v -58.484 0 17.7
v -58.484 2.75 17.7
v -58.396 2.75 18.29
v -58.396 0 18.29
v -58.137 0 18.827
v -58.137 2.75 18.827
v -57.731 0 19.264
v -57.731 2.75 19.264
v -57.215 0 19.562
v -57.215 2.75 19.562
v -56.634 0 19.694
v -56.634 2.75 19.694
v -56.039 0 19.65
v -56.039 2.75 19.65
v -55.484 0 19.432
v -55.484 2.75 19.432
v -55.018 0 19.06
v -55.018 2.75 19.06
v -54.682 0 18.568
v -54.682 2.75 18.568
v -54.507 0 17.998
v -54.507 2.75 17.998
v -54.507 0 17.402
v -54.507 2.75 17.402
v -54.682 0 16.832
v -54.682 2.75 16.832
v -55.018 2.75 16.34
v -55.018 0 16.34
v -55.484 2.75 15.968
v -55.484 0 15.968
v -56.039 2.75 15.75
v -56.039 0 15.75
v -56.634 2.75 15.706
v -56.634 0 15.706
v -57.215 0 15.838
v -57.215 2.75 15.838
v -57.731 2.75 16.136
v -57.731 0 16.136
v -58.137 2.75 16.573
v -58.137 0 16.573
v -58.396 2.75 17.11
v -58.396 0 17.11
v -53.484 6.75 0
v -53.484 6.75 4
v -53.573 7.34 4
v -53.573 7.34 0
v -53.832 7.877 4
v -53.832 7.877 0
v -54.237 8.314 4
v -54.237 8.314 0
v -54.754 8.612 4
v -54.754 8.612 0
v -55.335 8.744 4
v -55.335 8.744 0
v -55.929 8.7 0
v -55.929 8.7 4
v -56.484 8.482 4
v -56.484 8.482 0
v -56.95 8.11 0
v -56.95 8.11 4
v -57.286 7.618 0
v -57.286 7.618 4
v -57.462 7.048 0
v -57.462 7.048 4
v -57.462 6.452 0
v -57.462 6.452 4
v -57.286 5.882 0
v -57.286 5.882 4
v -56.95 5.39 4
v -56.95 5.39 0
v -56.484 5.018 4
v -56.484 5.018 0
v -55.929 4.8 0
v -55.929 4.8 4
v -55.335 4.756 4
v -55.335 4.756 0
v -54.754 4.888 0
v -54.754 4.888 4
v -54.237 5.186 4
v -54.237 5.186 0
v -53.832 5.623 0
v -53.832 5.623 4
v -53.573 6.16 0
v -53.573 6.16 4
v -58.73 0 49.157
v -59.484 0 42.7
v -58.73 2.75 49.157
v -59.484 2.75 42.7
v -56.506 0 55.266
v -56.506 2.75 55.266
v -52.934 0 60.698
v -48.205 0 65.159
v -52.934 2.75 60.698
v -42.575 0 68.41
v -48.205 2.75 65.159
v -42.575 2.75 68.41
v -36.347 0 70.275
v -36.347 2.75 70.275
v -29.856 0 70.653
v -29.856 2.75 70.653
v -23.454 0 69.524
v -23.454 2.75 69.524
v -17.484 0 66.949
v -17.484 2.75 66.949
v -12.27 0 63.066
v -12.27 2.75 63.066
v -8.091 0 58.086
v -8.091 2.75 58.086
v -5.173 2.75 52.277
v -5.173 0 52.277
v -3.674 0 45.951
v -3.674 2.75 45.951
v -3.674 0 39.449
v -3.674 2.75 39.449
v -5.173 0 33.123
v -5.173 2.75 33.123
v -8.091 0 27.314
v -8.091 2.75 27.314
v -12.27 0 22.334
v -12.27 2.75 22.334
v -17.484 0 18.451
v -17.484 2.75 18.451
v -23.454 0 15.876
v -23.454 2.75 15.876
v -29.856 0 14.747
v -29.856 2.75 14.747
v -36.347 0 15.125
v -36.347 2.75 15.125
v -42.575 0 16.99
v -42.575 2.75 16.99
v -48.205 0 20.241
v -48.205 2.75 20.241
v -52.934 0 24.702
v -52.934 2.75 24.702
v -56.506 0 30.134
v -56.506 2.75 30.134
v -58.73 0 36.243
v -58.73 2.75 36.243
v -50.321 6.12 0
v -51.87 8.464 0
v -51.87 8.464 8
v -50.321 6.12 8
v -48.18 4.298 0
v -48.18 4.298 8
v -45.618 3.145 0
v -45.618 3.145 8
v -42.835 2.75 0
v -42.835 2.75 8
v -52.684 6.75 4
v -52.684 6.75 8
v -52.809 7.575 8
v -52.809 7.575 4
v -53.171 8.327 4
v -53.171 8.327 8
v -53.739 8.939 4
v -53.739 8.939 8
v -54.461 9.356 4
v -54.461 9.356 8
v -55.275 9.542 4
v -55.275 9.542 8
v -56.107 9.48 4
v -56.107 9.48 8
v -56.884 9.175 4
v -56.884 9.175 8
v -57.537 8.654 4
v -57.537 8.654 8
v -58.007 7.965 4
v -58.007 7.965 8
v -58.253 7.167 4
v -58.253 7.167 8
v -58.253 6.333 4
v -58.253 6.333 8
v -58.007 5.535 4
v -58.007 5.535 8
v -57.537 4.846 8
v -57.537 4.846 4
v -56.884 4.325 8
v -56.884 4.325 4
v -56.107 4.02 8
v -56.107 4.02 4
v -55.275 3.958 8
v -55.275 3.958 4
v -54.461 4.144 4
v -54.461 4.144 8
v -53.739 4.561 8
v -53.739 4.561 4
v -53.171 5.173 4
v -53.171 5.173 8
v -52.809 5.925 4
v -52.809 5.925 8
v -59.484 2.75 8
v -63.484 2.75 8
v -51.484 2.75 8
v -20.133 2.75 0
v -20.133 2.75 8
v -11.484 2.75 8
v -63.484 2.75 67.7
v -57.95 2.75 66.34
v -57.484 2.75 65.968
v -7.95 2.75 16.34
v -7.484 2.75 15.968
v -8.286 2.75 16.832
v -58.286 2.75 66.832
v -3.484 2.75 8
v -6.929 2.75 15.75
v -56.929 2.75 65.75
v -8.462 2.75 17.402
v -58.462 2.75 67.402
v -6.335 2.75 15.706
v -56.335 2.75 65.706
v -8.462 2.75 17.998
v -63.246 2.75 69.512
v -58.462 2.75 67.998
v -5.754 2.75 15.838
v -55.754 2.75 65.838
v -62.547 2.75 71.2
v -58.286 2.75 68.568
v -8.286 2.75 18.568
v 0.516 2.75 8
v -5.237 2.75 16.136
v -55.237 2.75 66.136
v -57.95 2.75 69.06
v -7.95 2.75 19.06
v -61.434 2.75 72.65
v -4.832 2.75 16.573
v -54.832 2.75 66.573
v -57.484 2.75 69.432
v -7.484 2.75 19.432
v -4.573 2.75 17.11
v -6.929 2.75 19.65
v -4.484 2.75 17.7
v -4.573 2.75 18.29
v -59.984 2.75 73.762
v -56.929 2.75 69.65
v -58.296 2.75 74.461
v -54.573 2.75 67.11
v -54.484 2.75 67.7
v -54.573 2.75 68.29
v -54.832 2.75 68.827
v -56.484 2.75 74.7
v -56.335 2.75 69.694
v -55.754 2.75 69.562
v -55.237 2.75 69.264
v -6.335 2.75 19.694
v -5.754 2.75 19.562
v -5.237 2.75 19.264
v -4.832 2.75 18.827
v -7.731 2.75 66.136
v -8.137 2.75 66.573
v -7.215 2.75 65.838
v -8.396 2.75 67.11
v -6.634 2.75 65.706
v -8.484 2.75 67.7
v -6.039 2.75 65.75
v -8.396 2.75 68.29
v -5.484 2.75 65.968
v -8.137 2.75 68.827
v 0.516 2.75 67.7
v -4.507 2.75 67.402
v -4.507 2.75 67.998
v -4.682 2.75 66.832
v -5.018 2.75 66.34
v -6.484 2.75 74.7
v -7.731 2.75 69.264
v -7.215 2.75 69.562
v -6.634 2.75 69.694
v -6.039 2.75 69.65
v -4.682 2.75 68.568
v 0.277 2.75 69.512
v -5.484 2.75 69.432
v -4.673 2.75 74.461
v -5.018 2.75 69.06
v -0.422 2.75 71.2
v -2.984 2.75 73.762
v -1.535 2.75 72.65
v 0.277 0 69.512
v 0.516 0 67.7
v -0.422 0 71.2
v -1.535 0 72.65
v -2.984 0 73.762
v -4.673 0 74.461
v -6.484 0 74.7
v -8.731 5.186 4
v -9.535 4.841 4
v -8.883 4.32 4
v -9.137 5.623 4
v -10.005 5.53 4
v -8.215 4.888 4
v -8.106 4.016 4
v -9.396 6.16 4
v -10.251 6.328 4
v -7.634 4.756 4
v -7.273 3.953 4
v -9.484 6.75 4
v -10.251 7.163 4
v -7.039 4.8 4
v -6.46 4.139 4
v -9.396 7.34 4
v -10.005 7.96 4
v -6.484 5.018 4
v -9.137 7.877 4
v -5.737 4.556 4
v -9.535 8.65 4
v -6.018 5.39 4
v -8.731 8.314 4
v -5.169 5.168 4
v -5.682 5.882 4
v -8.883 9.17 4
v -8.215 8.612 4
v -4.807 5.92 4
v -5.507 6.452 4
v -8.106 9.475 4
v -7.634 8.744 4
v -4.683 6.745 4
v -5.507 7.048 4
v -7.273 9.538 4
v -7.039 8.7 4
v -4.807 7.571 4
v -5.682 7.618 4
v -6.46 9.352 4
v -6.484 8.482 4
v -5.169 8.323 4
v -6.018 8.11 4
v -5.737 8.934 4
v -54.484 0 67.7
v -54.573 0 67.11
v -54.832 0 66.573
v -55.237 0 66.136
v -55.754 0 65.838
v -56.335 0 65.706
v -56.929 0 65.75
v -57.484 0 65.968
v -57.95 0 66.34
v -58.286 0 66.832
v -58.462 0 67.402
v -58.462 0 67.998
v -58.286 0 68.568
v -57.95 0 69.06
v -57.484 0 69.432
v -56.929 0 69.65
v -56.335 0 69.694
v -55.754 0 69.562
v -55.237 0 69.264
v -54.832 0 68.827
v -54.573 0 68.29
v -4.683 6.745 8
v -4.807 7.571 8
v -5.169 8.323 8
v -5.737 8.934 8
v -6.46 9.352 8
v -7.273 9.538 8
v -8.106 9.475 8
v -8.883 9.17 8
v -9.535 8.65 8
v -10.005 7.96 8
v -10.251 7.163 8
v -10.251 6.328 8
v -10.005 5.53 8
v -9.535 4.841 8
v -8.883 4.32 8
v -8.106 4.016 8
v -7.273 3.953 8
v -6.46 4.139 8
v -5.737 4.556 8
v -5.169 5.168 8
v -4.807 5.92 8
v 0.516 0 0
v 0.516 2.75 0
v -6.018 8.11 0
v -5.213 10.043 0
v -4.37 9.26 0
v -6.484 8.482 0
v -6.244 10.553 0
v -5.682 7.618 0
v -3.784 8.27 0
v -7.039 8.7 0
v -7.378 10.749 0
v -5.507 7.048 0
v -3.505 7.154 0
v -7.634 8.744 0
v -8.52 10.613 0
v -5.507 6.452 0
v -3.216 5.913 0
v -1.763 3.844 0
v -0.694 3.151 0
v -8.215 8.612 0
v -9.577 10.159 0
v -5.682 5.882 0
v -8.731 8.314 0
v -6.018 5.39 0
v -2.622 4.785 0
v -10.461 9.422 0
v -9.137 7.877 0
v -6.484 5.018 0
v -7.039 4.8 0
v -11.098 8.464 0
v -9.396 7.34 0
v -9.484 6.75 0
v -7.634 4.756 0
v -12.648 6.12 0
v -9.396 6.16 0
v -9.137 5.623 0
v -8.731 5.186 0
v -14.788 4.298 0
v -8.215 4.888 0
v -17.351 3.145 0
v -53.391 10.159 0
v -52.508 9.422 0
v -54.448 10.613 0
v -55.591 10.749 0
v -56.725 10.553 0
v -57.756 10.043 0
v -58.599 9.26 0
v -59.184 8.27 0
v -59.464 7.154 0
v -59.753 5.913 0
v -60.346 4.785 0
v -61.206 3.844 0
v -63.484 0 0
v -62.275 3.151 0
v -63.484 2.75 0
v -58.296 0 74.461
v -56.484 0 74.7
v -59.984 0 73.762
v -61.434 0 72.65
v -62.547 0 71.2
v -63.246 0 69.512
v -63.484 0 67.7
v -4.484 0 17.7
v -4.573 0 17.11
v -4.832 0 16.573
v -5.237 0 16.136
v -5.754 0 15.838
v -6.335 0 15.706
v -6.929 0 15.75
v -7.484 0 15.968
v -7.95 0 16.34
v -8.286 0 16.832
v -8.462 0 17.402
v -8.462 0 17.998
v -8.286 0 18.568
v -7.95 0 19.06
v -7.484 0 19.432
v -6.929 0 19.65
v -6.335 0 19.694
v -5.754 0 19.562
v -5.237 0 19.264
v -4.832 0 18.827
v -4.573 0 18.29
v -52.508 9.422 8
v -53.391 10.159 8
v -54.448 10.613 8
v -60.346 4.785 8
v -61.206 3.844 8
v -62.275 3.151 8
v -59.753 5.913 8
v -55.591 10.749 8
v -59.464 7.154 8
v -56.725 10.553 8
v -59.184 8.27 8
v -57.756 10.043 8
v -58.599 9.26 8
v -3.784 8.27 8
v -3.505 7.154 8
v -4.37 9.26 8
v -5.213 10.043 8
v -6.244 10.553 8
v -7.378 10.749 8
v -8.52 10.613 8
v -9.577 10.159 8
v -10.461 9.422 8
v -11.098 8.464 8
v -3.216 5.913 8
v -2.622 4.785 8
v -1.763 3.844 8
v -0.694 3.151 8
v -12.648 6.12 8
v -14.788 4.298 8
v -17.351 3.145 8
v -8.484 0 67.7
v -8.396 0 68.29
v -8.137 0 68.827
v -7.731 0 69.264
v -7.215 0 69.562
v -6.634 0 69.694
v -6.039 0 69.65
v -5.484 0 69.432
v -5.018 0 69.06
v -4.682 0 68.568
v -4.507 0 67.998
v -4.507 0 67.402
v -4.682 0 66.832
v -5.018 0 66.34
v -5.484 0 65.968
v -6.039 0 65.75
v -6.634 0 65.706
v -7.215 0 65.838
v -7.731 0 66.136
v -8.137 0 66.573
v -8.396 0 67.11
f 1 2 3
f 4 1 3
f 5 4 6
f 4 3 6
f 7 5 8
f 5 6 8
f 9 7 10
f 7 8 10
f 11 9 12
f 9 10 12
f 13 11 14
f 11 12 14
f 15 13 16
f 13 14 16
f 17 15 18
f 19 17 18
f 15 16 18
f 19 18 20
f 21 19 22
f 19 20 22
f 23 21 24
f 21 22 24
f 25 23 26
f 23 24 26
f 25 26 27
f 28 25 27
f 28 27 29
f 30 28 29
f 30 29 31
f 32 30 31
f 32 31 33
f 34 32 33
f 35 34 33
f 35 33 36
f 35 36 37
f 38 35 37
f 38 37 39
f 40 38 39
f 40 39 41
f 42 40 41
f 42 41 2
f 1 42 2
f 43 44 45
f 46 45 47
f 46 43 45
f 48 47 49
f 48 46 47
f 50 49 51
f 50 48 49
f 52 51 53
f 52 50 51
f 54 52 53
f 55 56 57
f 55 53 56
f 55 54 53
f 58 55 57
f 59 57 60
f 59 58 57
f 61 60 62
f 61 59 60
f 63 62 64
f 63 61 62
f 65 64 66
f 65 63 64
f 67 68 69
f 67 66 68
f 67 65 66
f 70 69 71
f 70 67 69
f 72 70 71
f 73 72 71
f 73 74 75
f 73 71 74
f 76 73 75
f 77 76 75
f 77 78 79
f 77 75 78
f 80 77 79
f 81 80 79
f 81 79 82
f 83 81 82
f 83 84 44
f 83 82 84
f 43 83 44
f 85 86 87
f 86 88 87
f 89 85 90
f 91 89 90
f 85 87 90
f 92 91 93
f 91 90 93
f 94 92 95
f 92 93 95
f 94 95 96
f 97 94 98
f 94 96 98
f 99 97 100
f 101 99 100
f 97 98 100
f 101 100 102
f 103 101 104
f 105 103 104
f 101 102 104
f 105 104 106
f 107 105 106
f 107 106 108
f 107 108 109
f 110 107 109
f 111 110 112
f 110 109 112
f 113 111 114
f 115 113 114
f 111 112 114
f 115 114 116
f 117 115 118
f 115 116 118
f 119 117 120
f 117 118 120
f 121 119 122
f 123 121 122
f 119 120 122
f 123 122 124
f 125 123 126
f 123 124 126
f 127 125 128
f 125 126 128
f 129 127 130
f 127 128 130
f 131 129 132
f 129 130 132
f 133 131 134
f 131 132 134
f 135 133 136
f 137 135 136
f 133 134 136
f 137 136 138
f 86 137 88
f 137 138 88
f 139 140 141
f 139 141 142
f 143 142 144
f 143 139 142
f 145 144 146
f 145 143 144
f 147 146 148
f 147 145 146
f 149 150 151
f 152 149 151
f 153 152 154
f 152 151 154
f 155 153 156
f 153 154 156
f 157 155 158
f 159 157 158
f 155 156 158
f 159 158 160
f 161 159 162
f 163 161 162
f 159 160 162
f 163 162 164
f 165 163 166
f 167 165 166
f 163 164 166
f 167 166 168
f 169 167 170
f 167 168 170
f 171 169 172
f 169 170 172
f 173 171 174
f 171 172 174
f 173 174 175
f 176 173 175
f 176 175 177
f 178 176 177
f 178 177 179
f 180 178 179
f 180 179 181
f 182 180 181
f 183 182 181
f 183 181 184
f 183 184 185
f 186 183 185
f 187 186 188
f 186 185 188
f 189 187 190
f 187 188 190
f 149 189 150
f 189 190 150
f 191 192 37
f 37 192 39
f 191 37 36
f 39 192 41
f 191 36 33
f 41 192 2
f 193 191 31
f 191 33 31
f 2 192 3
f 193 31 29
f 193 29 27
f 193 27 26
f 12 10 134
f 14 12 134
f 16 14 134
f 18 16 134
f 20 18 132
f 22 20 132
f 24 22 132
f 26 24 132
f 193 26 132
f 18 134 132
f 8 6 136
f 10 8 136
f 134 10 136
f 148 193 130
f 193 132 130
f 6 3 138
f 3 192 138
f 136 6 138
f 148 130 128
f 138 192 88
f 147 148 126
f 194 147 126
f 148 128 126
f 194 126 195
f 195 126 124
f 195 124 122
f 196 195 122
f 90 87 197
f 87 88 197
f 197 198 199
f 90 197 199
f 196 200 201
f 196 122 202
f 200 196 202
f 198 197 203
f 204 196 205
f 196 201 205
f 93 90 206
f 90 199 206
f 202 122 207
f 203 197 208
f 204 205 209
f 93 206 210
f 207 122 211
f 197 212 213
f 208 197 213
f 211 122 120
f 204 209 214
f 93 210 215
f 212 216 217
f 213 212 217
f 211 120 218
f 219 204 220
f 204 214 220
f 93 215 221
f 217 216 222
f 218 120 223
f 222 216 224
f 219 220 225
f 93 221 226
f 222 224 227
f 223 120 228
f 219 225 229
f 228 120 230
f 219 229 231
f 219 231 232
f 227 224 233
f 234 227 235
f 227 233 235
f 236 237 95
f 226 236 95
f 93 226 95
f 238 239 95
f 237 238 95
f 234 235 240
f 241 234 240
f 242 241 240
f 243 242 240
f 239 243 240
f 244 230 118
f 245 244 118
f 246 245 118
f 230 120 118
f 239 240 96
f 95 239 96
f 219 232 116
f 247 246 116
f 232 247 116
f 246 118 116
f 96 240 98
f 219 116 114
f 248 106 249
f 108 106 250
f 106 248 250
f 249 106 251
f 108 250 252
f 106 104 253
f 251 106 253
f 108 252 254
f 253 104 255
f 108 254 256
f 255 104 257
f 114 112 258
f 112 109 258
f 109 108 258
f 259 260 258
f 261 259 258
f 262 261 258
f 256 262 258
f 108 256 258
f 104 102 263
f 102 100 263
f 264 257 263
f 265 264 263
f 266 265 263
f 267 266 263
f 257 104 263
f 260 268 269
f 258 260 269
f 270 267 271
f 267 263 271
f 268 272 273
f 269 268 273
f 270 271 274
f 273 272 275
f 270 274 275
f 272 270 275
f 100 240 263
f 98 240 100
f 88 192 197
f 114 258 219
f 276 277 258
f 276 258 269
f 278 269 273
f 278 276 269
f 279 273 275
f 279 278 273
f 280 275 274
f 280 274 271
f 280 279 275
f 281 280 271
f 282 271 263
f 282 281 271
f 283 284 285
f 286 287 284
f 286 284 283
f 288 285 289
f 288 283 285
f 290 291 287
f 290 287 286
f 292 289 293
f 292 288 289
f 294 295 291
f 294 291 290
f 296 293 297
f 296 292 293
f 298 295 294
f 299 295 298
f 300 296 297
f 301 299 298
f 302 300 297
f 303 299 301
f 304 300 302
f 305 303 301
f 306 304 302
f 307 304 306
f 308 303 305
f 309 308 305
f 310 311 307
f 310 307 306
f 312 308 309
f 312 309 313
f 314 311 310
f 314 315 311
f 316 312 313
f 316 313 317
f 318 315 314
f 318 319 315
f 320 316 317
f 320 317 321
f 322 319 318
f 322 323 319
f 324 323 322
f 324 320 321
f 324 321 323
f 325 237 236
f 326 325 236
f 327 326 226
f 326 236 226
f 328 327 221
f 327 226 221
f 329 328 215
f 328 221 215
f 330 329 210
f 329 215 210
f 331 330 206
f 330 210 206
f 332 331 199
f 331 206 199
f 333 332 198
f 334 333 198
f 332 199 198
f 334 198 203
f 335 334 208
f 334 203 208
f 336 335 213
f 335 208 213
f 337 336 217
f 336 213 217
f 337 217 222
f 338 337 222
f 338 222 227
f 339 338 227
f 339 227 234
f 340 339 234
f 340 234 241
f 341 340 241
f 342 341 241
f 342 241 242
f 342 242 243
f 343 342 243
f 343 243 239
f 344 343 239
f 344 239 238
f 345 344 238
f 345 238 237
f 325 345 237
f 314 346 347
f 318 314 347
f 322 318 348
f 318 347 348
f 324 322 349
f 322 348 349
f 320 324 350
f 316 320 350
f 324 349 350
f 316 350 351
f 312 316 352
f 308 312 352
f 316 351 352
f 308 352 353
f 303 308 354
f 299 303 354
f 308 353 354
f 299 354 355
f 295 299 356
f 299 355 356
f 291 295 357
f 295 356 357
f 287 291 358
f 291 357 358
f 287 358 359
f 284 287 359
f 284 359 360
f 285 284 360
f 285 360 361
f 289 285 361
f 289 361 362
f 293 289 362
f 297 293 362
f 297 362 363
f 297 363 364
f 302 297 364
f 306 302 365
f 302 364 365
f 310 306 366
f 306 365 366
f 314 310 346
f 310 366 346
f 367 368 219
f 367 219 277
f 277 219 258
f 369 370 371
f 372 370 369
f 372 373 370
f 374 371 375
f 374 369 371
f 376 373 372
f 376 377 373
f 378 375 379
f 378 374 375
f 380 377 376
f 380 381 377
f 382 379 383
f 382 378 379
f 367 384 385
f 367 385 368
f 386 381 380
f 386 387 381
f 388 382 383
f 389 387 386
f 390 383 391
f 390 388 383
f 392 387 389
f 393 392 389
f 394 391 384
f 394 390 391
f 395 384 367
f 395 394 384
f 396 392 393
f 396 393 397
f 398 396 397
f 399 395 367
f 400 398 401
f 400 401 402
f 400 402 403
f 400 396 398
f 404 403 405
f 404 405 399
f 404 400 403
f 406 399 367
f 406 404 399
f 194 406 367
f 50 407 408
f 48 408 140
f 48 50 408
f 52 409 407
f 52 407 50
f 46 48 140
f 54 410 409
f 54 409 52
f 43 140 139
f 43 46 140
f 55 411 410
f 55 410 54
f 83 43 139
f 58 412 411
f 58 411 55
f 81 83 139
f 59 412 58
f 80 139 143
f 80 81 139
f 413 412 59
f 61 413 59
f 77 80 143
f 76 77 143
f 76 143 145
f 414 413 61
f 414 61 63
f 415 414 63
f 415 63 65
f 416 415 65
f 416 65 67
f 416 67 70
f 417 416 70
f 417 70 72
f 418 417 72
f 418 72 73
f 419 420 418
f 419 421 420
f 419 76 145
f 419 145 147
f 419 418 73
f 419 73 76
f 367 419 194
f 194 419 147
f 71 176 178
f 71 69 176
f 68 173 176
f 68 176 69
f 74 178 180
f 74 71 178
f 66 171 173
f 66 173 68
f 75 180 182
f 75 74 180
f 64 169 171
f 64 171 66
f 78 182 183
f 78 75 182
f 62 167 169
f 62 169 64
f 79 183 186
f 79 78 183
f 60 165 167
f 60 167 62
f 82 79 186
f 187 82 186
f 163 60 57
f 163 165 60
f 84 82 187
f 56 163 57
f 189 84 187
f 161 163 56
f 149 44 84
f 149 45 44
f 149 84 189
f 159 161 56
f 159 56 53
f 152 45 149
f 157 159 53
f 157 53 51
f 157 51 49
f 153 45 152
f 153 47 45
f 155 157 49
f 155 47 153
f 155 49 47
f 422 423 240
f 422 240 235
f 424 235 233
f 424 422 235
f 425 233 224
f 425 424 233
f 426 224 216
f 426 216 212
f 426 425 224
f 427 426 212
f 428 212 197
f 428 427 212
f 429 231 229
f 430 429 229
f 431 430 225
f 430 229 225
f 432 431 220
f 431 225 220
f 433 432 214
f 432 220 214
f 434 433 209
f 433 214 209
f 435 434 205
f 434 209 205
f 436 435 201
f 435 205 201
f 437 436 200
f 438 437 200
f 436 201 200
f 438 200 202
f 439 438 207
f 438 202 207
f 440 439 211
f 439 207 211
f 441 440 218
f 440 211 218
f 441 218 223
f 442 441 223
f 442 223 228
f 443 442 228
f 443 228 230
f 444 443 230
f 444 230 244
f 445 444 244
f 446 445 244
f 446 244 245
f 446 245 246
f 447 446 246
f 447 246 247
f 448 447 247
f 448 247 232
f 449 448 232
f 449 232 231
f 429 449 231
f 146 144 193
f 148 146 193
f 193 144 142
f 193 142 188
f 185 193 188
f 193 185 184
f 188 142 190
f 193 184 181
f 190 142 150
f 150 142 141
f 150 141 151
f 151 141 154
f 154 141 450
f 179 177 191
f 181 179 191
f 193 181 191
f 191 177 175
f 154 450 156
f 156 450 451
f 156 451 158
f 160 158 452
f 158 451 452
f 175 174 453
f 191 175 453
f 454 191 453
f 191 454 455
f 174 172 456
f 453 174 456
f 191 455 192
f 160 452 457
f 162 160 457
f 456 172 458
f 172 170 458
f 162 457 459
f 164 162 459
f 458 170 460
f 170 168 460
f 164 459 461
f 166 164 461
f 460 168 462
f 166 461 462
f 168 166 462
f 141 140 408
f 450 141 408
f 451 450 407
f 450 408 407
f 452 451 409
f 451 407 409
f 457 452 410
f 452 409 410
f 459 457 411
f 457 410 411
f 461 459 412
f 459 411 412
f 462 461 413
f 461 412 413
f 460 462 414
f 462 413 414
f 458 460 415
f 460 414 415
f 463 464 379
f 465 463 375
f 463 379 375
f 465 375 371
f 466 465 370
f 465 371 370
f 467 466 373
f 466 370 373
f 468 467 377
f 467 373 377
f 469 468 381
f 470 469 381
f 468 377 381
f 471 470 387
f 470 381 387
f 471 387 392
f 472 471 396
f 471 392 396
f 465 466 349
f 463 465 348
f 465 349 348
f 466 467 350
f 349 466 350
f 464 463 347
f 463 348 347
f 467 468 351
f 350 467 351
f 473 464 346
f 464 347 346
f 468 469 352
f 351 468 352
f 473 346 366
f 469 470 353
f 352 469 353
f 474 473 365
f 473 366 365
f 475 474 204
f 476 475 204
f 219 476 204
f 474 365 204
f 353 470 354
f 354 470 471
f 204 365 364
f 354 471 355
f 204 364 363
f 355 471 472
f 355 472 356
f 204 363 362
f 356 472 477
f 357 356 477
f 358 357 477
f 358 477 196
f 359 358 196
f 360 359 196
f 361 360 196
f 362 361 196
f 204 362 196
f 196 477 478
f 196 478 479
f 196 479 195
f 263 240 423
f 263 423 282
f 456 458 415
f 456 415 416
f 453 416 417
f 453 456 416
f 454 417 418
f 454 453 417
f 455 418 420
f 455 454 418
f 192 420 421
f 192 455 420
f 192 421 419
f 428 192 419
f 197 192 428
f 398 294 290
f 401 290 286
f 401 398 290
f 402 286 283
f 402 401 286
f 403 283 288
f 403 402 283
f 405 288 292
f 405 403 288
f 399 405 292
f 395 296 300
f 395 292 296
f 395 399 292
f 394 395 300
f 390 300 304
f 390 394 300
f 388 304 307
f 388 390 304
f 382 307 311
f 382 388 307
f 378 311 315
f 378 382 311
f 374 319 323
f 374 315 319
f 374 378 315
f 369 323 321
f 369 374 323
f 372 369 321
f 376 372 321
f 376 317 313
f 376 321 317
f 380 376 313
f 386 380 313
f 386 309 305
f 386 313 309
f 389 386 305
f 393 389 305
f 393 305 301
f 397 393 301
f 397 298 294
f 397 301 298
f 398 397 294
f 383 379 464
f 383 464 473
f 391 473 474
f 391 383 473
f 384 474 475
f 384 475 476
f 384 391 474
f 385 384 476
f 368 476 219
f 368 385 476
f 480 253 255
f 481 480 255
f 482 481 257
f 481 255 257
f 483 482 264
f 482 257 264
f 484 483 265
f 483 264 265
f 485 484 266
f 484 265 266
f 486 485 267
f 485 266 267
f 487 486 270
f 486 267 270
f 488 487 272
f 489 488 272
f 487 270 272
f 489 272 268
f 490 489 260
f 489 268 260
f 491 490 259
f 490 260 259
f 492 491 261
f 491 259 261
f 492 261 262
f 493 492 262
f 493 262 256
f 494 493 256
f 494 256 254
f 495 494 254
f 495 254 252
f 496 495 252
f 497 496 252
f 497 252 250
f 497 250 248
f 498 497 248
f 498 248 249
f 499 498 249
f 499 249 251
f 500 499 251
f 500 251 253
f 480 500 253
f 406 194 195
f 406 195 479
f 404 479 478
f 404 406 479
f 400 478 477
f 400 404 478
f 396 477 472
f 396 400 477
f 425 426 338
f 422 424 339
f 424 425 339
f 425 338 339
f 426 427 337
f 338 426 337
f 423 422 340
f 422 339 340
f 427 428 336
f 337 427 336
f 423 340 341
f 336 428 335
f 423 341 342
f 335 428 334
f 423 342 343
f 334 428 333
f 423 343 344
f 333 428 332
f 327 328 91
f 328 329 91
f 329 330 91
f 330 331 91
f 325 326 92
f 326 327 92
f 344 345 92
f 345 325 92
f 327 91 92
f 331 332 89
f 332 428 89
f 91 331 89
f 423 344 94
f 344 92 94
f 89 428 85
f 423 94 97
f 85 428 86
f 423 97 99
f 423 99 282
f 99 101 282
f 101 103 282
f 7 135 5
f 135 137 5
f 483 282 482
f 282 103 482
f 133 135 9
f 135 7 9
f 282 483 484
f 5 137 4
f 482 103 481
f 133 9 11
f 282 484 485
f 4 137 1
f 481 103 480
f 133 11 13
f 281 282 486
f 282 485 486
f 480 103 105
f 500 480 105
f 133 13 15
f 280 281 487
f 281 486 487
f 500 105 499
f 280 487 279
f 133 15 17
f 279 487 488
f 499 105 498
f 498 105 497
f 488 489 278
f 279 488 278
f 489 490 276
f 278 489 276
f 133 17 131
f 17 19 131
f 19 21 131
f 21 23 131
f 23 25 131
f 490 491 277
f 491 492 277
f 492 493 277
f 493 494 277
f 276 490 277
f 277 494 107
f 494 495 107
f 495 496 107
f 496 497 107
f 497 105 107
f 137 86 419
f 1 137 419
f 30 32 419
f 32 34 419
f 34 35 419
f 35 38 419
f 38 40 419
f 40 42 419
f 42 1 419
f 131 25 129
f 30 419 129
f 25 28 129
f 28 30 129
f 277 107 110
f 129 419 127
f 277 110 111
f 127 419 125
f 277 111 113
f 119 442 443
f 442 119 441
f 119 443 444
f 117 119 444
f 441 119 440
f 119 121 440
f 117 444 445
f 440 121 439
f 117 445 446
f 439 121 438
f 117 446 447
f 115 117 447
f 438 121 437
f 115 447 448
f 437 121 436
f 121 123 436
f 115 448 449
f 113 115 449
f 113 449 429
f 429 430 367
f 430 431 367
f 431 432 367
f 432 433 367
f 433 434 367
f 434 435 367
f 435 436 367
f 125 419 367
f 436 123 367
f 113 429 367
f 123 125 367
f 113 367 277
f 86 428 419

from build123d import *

# Parameters (mm, degrees)
SCHIZZO1_R                        = 2
ESTRUSIONE_ESTRUSIONE1_DEPTH      = 8
SCHIZZO3_W                        = 50
SCHIZZO3_H                        = 2.75
ESTRUSIONE_ESTRUSIONE3_DEPTH      = 55
RACCORDO1_R                       = 4
SCHIZZO4_R                        = 23
TAGLIO_ESTRUSIONE1_DEPTH          = 4
SCHIZZO5_R                        = 2
TAGLIO_ESTRUSIONE2_DEPTH          = 4
RACCORDO2_R                       = 124
SCHIZZO6_R                        = 2.8
TAGLIO_ESTRUSIONE3_DEPTH          = 4
SCHIZZO7_W                        = 64
SCHIZZO7_H                        = 66
SCHIZZO7_R                        = 28
ESTRUSIONE_ESTRUSIONE4_DEPTH      = 4
SCHIZZO8_R                        = 28
TAGLIO_ESTRUSIONE4_DEPTH          = 10
SCHIZZO9_R                        = 2
TAGLIO_ESTRUSIONE5_DEPTH          = 4
RACCORDO3_R                       = 3
RACCORDO4_R                       = 3
SCHIZZO10_W                       = 88.736042833
SCHIZZO10_H                       = 81.022332295
TAGLIO_ESTRUSIONE6_DEPTH          = 1.25
SCHIZZO11_W                       = 58
SCHIZZO11_H                       = 2.75
ESTRUSIONE_ESTRUSIONE5_DEPTH      = 0.7
RACCORDO6_START                   = -1
RACCORDO6_DEPTH                   = 5
RACCORDO8_START                   = -1
RACCORDO8_DEPTH                   = 5
ESTRUSIONE_ESTRUSIONE6_DEPTH      = 4
ESTRUSIONE_ESTRUSIONE6_DEPTH_BACK = 2.75
SCHIZZO12_W                       = 64
SCHIZZO12_H                       = 11.748328584
SCHIZZO14_W                       = 64
SCHIZZO14_H                       = 11.748328584
TAGLIO_ESTRUSIONE7_DEPTH          = 4
RACCORDO9_R                       = 10
RACCORDO10_R                      = 5


with BuildPart() as part:
    # Schizzo1 → Estrusione-Estrusione1 (new body)
    with BuildSketch(Plane.XY):
        with BuildLine():
            Line((-59.484364928, 0), (-3.484364928, 0))
            Line((-3.484364928, 0), (-3.484364928, 6.75))
            ThreePointArc((-3.484364928, 6.75), (-7.484364928, 10.75), (-11.484364928, 6.75))
            Line((-11.484364928, 6.75), (-11.484364928, 2.75))
            Line((-11.484364928, 2.75), (-23.484364928, 2.75))
            Line((-23.484364928, 2.75), (-39.484364928, 2.75))
            Line((-39.484364928, 2.75), (-51.484364928, 2.75))
            Line((-51.484364928, 2.75), (-51.484364928, 6.75))
            ThreePointArc((-51.484364928, 6.75), (-55.484364928, 10.75), (-59.484364928, 6.75))
            Line((-59.484364928, 6.75), (-59.484364928, 0))
        make_face()
        with Locations((-55.484364928, 6.75)):
            Circle(SCHIZZO1_R, mode=Mode.SUBTRACT)
        with Locations(Location((-7.484364928, 6.75, 0), (0, 0, 180))):
            Circle(SCHIZZO1_R, mode=Mode.SUBTRACT)
    extrude(amount=ESTRUSIONE_ESTRUSIONE1_DEPTH)

    # Schizzo3 → Estrusione-Estrusione3 (add)
    with BuildSketch(Plane.XY.offset(8)):
        with Locations((-31.482821648, 1.375)):
            Rectangle(SCHIZZO3_W, SCHIZZO3_H)
    extrude(amount=ESTRUSIONE_ESTRUSIONE3_DEPTH)

    # Raccordo1
    raccordo1_edges = [part.edges().sort_by_distance(p)[0] for p in [
        (-56.482821648, 1.375, 63),
        (-6.482821648, 1.375, 63),
    ]]
    fillet(raccordo1_edges, radius=RACCORDO1_R)

    # Schizzo4 → Taglio-Estrusione1 (cut)
    with BuildSketch(Plane(origin=(0, 2.75, 0), x_dir=(1, 0, 0), z_dir=(0, 1, 0))):
        with Locations(Location((-31.482821648, -35.97589666, 0), (0, 0, 180))):
            Circle(SCHIZZO4_R)
    extrude(amount=-TAGLIO_ESTRUSIONE1_DEPTH, mode=Mode.SUBTRACT)

    # Schizzo5 → Taglio-Estrusione2 (cut)
    with BuildSketch(Plane(origin=(0, 2.75, 0), x_dir=(1, 0, 0), z_dir=(0, 1, 0))):
        with Locations(Location((-51.482821648, -15.97589666, 0), (0, 0, 180))):
            Circle(SCHIZZO5_R)
        with Locations(Location((-51.482821648, -55.97589666, 0), (0, 0, 180))):
            Circle(SCHIZZO5_R)
        with Locations(Location((-11.482821648, -15.97589666, 0), (0, 0, 180))):
            Circle(SCHIZZO5_R)
        with Locations(Location((-11.482821648, -55.97589666, 0), (0, 0, 180))):
            Circle(SCHIZZO5_R)
    extrude(amount=-TAGLIO_ESTRUSIONE2_DEPTH, mode=Mode.SUBTRACT)

    # Raccordo2
    # the kernel refuses this fillet: 124 mm, written as the material it adds along each edge
    with BuildSketch(Plane(origin=(-56.482821648, 2.75, 8), x_dir=(0, 0, 1), z_dir=(0, -1, 0))) as raccordo2_piece_1:
        with BuildLine():
            CenterArc((27.117770399, 124), RACCORDO2_R, 257.367798326, 12.632201674)
            Line((0, 3.00154328), (0, 0))
            Line((0, 0), (27.117770399, 0))
        make_face()
    extrude(amount=2.75)
    with BuildSketch(Plane(origin=(-6.482821648, 0, 8), x_dir=(0, 0, 1), z_dir=(0, 1, 0))) as raccordo2_piece_2:
        with BuildLine():
            CenterArc((27.10399461, 124), RACCORDO2_R, 257.374321421, 12.625678579)
            Line((0, 2.99845672), (0, 0))
            Line((0, 0), (27.10399461, 0))
        make_face()
    extrude(amount=2.75)

    # Schizzo6 → Taglio-Estrusione3 (cut)
    with BuildSketch(Plane.XY.offset(8)):
        with Locations((-55.484364928, 6.75)):
            Circle(SCHIZZO6_R)
        with Locations((-7.48260826, 6.745335699)):
            Circle(SCHIZZO6_R)
    extrude(amount=-TAGLIO_ESTRUSIONE3_DEPTH, mode=Mode.SUBTRACT)

    # Schizzo7 → Estrusione-Estrusione4 (add)
    with BuildSketch(Plane(origin=(0, 2.75, 0), x_dir=(1, 0, 0), z_dir=(0, 1, 0))):
        with Locations((-31.484364928, -41)):
            Rectangle(SCHIZZO7_W, SCHIZZO7_H)
        with Locations(Location((-31.484364928, -42.7, 0), (0, 0, 180))):
            Circle(SCHIZZO7_R, mode=Mode.SUBTRACT)
    extrude(amount=-ESTRUSIONE_ESTRUSIONE4_DEPTH)

    # Schizzo8 → Taglio-Estrusione4 (cut)
    with BuildSketch(Plane(origin=(0, 2.75, 0), x_dir=(1, 0, 0), z_dir=(0, 1, 0))):
        with Locations(Location((-31.484364928, -42.7, 0), (0, 0, 180))):
            Circle(SCHIZZO8_R)
    extrude(amount=-TAGLIO_ESTRUSIONE4_DEPTH, mode=Mode.SUBTRACT)

    # Schizzo9 → Taglio-Estrusione5 (cut)
    with BuildSketch(Plane(origin=(0, 2.75, 0), x_dir=(1, 0, 0), z_dir=(0, 1, 0))):
        with Locations(Location((-6.484364928, -67.7, 0), (0, 0, 180))):
            Circle(SCHIZZO9_R)
        with Locations((-6.484364928, -17.7)):
            Circle(SCHIZZO9_R)
        with Locations((-56.484364928, -67.7)):
            Circle(SCHIZZO9_R)
        with Locations(Location((-56.484364928, -17.7, 0), (0, 0, 180))):
            Circle(SCHIZZO9_R)
    extrude(amount=-TAGLIO_ESTRUSIONE5_DEPTH, mode=Mode.SUBTRACT)

    # Raccordo3
    # the kernel refuses this fillet: 3 mm, written as the material it adds along each edge
    with BuildSketch(Plane(origin=(-59.484364928, 0, 8), x_dir=(0, -1, 0), z_dir=(1, 0, 0))) as raccordo3_piece_1:
        with BuildLine():
            CenterArc((3, 2.436698586), RACCORDO3_R, 180, 54.314665287)
            Line((0, 2.436698586), (0, 0))
            Line((0, 0), (1.25, 0))
        make_face()
    extrude(amount=56)
    with BuildSketch(Plane(origin=(-3.484364928, 0, 8), x_dir=(1, 0, 0), z_dir=(0, 1, 0)), Plane(origin=(-59.484364928, 2.75, 8), x_dir=(-1, 0, 0), z_dir=(0, -1, 0))) as raccordo3_piece_2:
        with BuildLine():
            CenterArc((RACCORDO3_R, RACCORDO3_R), RACCORDO3_R, 180, 90)
            Line((0, RACCORDO3_R), (0, 0))
            Line((0, 0), (RACCORDO3_R, 0))
        make_face()
    extrude(amount=2.75)
    with BuildSketch(Plane(origin=(-65.576111393, 0, 8), x_dir=(0, -1, 0), z_dir=(1, 0, 0))) as raccordo3_piece_3a_section:
        with BuildLine():
            CenterArc((3, 2.436698586), RACCORDO3_R, 180, 54.314665287)
            Line((0, 2.436698586), (0, 0))
            Line((0, 0), (1.25, 0))
        make_face()
    raccordo3_piece_3a = extrude(amount=62.091746466, mode=Mode.PRIVATE)
    raccordo3_piece_3a = split(raccordo3_piece_3a, bisect_by=Plane(origin=(-63.484364928, 0, 8), z_dir=(1, 0, 0)), keep=Keep.TOP, mode=Mode.PRIVATE)
    raccordo3_piece_3a = split(raccordo3_piece_3a, bisect_by=Plane(origin=(-59.484364928, 0, 8), z_dir=(-1, 0, 0)), keep=Keep.TOP, mode=Mode.PRIVATE)
    with BuildSketch(Plane(origin=(-59.484364928, 2.75, 8), x_dir=(-1, 0, 0), z_dir=(0, -1, 0))) as raccordo3_piece_3b_section:
        with BuildLine():
            CenterArc((RACCORDO3_R, RACCORDO3_R), RACCORDO3_R, 180, 90)
            Line((0, RACCORDO3_R), (0, 0))
            Line((0, 0), (RACCORDO3_R, 0))
        make_face()
    raccordo3_piece_3b = extrude(amount=10.25, mode=Mode.PRIVATE)
    raccordo3_piece_3b = split(raccordo3_piece_3b, bisect_by=Plane(origin=(-59.484364928, 0, 8), z_dir=(0, -1, 0)), keep=Keep.TOP, mode=Mode.PRIVATE)
    raccordo3_piece_3b = split(raccordo3_piece_3b, bisect_by=Plane(origin=(-59.484364928, -1.25, 8), z_dir=(0, 1, 0)), keep=Keep.TOP, mode=Mode.PRIVATE)
    raccordo3_piece_3 = raccordo3_piece_3a & raccordo3_piece_3b
    add(raccordo3_piece_3)
    with BuildSketch(Plane(origin=(-3.484364928, -7.5, 8), x_dir=(1, 0, 0), z_dir=(0, 1, 0))) as raccordo3_piece_4a_section:
        with BuildLine():
            CenterArc((RACCORDO3_R, RACCORDO3_R), RACCORDO3_R, 180, 90)
            Line((0, RACCORDO3_R), (0, 0))
            Line((0, 0), (RACCORDO3_R, 0))
        make_face()
    raccordo3_piece_4a = extrude(amount=10.25, mode=Mode.PRIVATE)
    raccordo3_piece_4a = split(raccordo3_piece_4a, bisect_by=Plane(origin=(-3.484364928, 0, 8), z_dir=(0, -1, 0)), keep=Keep.TOP, mode=Mode.PRIVATE)
    raccordo3_piece_4a = split(raccordo3_piece_4a, bisect_by=Plane(origin=(-3.484364928, -1.25, 8), z_dir=(0, 1, 0)), keep=Keep.TOP, mode=Mode.PRIVATE)
    with BuildSketch(Plane(origin=(-59.484364928, 0, 8), x_dir=(0, -1, 0), z_dir=(1, 0, 0))) as raccordo3_piece_4b_section:
        with BuildLine():
            CenterArc((3, 2.436698586), RACCORDO3_R, 180, 54.314665287)
            Line((0, 2.436698586), (0, 0))
            Line((0, 0), (1.25, 0))
        make_face()
    raccordo3_piece_4b = extrude(amount=62.091746466, mode=Mode.PRIVATE)
    raccordo3_piece_4b = split(raccordo3_piece_4b, bisect_by=Plane(origin=(0.515635072, 0, 8), z_dir=(-1, 0, 0)), keep=Keep.TOP, mode=Mode.PRIVATE)
    raccordo3_piece_4b = split(raccordo3_piece_4b, bisect_by=Plane(origin=(-3.484364928, 0, 8), z_dir=(1, 0, 0)), keep=Keep.TOP, mode=Mode.PRIVATE)
    raccordo3_piece_4 = raccordo3_piece_4a & raccordo3_piece_4b
    add(raccordo3_piece_4)
    # the kernel refuses this fillet: 3 mm, written as the material it takes off along each edge
    with BuildSketch(Plane(origin=(0.515635072, 10.25, 74), x_dir=(-1, 0, 0), z_dir=(0, -1, 0)), Plane(origin=(-63.484364928, 10.25, 74), x_dir=(0, 0, -1), z_dir=(0, -1, 0))) as raccordo3_2_piece_1:
        with BuildLine():
            CenterArc((RACCORDO3_R, RACCORDO3_R), RACCORDO3_R, 180, 90)
            Line((0, RACCORDO3_R), (0, 0))
            Line((0, 0), (RACCORDO3_R, 0))
        make_face()
    extrude(amount=19, mode=Mode.SUBTRACT)

    # Raccordo4
    # the kernel refuses this fillet: 3 mm, written as the material it takes off along each edge
    with BuildSketch(Plane(origin=(-63.484364928, 9.392135624, 8), x_dir=(0.9963405296085128, 0, -0.08547250469845889), z_dir=(0, -1, 0))) as raccordo4_piece_1:
        with BuildLine():
            CenterArc((2.761933602, 2.903549084), RACCORDO4_R, 184.903196278, 70.528779366)
            Line((-0.227087987, 2.64713157), (-0.525990146, 2.621489819))
            Line((-0.525990146, 2.621489819), (-0.298902159, -0.025641751))
            Line((-0.298902159, -0.025641751), (0.025641751, -0.298902159))
            ThreePointArc((0.025641751, -0.298902159), (1.021982281, -0.213429654), (1.931887045, -0.290354908))
            Line((1.931887045, -0.290354908), (2.007345823, 0))
        make_face()
    extrude(amount=17.284271247, mode=Mode.SUBTRACT)
    with BuildSketch(Plane(origin=(0.515635072, 9.392135624, 8), x_dir=(-0.9963405296085196, 0, -0.08547250469837912), z_dir=(0, -1, 0))) as raccordo4_piece_2:
        with BuildLine():
            CenterArc((2.761933602, -2.903549084), RACCORDO4_R, 104.568024357, 70.528779366)
            Line((-0.227087987, -2.64713157), (-0.525990146, -2.621489819))
            Line((-0.525990146, -2.621489819), (-0.298902159, 0.025641751))
            Line((-0.298902159, 0.025641751), (0.025641751, 0.298902159))
            ThreePointArc((0.025641751, 0.298902159), (1.021982281, 0.213429654), (1.931887045, 0.290354908))
            Line((1.931887045, 0.290354908), (2.007345823, 0))
        make_face()
    extrude(amount=17.284271247, mode=Mode.SUBTRACT)

    # Schizzo10 → Taglio-Estrusione6 (cut)
    with BuildSketch(Plane.XZ.offset(1.25)):
        with Locations((-36.992061707, 40.511166147)):
            Rectangle(SCHIZZO10_W, SCHIZZO10_H)
    extrude(amount=-TAGLIO_ESTRUSIONE6_DEPTH, mode=Mode.SUBTRACT)

    # Schizzo11 → Estrusione-Estrusione5 (add)
    with BuildSketch(Plane.XY.offset(74)):
        with Locations((-31.484364928, 1.375)):
            Rectangle(SCHIZZO11_W, SCHIZZO11_H)
    extrude(amount=ESTRUSIONE_ESTRUSIONE5_DEPTH)

    # Raccordo6: read off the stored shape, not the designer's step
    # Raccordo6 outline → Raccordo6 (cut)
    with BuildSketch(Plane(origin=(0, 0, 0), x_dir=(1, 0, 0), z_dir=(0, 1, 0)).offset(RACCORDO6_START)):
        with BuildLine():
            Line((-60.484364928, -74.7), (-56.484364928, -74.7))
            ThreePointArc((-56.484364928, -74.7), (-61.434112396, -72.649747468), (-63.484364928, -67.7))
            Line((-63.484364928, -67.7), (-63.484364928, -71))
            ThreePointArc((-63.484364928, -71), (-62.605685271, -73.121320344), (-60.484364928, -74))
            Line((-60.484364928, -74), (-60.484364928, -74.7))
        make_face()
    extrude(amount=RACCORDO6_DEPTH, mode=Mode.SUBTRACT)

    # Raccordo8: read off the stored shape, not the designer's step
    # Raccordo8 outline → Raccordo8 (cut)
    with BuildSketch(Plane(origin=(0, 0, 0), x_dir=(1, 0, 0), z_dir=(0, 1, 0)).offset(RACCORDO8_START)):
        with BuildLine():
            ThreePointArc((0.515635072, -67.7), (-1.53461746, -72.649747468), (-6.484364928, -74.7))
            Line((-6.484364928, -74.7), (-2.484364928, -74.7))
            Line((-2.484364928, -74.7), (-2.484364928, -74))
            ThreePointArc((-2.484364928, -74), (-0.363044584, -73.121320344), (0.515635072, -71))
            Line((0.515635072, -71), (0.515635072, -67.7))
        make_face()
    extrude(amount=RACCORDO8_DEPTH, mode=Mode.SUBTRACT)

    # Schizzo12 → Estrusione-Estrusione6 (add, two sides: drawn at the far end of the back side and taken through both)
    with BuildSketch(Plane.XZ.offset(-ESTRUSIONE_ESTRUSIONE6_DEPTH_BACK)):
        with Locations((-31.484364928, 5.874164292)):
            Rectangle(SCHIZZO12_W, SCHIZZO12_H)
    extrude(amount=ESTRUSIONE_ESTRUSIONE6_DEPTH + ESTRUSIONE_ESTRUSIONE6_DEPTH_BACK)

    # Schizzo14 → Taglio-Estrusione7 (cut)
    with BuildSketch(Plane.XZ.offset(4)):
        with Locations((-31.484364928, 5.874164292)):
            Rectangle(SCHIZZO14_W, SCHIZZO14_H)
    extrude(amount=-TAGLIO_ESTRUSIONE7_DEPTH, mode=Mode.SUBTRACT)

    # Raccordo9
    # the kernel refuses this fillet: 10 mm, written as the material it adds along each edge
    with BuildSketch(Plane(origin=(-11.484364928, 2.75, 0), x_dir=(-1, 0, 0), z_dir=(0, 0, 1))) as raccordo9_piece_1:
        with BuildLine():
            CenterArc((8.649110641, -10), RACCORDO9_R, 90, 64.623066475)
            Line((-0.385968388, -5.714285714), (-1.289476291, -5.285714286))
            ThreePointArc((-1.289476291, -5.285714286), (-1, -4), (-1, 0))
            Line((-1, 0), (0, 1))
            Line((0, 1), (8.649110641, 1))
            Line((8.649110641, 1), (8.649110641, 0))
        make_face()
    extrude(amount=8)
    with BuildSketch(Plane(origin=(-51.484364928, 2.75, 0), x_dir=(1, 0, 0), z_dir=(0, 0, 1))) as raccordo9_piece_2:
        with BuildLine():
            CenterArc((8.649110641, 10), RACCORDO9_R, 205.376933525, 64.623066475)
            Line((-0.385968388, 5.714285714), (-1.289476291, 5.285714286))
            ThreePointArc((-1.289476291, 5.285714286), (-1, 4), (-1, 0))
            Line((-1, 0), (0, -1))
            Line((0, -1), (8.649110641, -1))
            Line((8.649110641, -1), (8.649110641, 0))
        make_face()
    extrude(amount=8)

    # Raccordo10
    # the kernel refuses this fillet: 5 mm, written as the material it adds along each edge
    with BuildSketch(Plane(origin=(-3.484364928, 2.75, 0), x_dir=(-0.00463594795173994, 0.9999892539355554, 0), z_dir=(0, 0, 1)), Plane(origin=(-59.484364928, 2.75, 8), x_dir=(0.0046359479517115295, 0.9999892539355555, 0), z_dir=(0, 0, -1))) as raccordo10_piece_1:
        with BuildLine():
            CenterArc((4.885112311, -4.97676653), RACCORDO10_R, 95.525581396, 73.208552885)
            Line((-0.018543792, -3.999957016), (-0.508909402, -3.902276064))
            ThreePointArc((-0.508909402, -3.902276064), (-0.509266523, -1.997660534), (-0.499994627, 0.002317974))
            Line((-0.499994627, 0.002317974), (0.002317974, 0.499994627))
            ThreePointArc((0.002317974, 0.499994627), (4.00227499, 0.481450835), (4.355516392, 0.497676653))
            Line((4.355516392, 0.497676653), (4.403661476, 0))
        make_face()
    extrude(amount=8)


solid = part.part
